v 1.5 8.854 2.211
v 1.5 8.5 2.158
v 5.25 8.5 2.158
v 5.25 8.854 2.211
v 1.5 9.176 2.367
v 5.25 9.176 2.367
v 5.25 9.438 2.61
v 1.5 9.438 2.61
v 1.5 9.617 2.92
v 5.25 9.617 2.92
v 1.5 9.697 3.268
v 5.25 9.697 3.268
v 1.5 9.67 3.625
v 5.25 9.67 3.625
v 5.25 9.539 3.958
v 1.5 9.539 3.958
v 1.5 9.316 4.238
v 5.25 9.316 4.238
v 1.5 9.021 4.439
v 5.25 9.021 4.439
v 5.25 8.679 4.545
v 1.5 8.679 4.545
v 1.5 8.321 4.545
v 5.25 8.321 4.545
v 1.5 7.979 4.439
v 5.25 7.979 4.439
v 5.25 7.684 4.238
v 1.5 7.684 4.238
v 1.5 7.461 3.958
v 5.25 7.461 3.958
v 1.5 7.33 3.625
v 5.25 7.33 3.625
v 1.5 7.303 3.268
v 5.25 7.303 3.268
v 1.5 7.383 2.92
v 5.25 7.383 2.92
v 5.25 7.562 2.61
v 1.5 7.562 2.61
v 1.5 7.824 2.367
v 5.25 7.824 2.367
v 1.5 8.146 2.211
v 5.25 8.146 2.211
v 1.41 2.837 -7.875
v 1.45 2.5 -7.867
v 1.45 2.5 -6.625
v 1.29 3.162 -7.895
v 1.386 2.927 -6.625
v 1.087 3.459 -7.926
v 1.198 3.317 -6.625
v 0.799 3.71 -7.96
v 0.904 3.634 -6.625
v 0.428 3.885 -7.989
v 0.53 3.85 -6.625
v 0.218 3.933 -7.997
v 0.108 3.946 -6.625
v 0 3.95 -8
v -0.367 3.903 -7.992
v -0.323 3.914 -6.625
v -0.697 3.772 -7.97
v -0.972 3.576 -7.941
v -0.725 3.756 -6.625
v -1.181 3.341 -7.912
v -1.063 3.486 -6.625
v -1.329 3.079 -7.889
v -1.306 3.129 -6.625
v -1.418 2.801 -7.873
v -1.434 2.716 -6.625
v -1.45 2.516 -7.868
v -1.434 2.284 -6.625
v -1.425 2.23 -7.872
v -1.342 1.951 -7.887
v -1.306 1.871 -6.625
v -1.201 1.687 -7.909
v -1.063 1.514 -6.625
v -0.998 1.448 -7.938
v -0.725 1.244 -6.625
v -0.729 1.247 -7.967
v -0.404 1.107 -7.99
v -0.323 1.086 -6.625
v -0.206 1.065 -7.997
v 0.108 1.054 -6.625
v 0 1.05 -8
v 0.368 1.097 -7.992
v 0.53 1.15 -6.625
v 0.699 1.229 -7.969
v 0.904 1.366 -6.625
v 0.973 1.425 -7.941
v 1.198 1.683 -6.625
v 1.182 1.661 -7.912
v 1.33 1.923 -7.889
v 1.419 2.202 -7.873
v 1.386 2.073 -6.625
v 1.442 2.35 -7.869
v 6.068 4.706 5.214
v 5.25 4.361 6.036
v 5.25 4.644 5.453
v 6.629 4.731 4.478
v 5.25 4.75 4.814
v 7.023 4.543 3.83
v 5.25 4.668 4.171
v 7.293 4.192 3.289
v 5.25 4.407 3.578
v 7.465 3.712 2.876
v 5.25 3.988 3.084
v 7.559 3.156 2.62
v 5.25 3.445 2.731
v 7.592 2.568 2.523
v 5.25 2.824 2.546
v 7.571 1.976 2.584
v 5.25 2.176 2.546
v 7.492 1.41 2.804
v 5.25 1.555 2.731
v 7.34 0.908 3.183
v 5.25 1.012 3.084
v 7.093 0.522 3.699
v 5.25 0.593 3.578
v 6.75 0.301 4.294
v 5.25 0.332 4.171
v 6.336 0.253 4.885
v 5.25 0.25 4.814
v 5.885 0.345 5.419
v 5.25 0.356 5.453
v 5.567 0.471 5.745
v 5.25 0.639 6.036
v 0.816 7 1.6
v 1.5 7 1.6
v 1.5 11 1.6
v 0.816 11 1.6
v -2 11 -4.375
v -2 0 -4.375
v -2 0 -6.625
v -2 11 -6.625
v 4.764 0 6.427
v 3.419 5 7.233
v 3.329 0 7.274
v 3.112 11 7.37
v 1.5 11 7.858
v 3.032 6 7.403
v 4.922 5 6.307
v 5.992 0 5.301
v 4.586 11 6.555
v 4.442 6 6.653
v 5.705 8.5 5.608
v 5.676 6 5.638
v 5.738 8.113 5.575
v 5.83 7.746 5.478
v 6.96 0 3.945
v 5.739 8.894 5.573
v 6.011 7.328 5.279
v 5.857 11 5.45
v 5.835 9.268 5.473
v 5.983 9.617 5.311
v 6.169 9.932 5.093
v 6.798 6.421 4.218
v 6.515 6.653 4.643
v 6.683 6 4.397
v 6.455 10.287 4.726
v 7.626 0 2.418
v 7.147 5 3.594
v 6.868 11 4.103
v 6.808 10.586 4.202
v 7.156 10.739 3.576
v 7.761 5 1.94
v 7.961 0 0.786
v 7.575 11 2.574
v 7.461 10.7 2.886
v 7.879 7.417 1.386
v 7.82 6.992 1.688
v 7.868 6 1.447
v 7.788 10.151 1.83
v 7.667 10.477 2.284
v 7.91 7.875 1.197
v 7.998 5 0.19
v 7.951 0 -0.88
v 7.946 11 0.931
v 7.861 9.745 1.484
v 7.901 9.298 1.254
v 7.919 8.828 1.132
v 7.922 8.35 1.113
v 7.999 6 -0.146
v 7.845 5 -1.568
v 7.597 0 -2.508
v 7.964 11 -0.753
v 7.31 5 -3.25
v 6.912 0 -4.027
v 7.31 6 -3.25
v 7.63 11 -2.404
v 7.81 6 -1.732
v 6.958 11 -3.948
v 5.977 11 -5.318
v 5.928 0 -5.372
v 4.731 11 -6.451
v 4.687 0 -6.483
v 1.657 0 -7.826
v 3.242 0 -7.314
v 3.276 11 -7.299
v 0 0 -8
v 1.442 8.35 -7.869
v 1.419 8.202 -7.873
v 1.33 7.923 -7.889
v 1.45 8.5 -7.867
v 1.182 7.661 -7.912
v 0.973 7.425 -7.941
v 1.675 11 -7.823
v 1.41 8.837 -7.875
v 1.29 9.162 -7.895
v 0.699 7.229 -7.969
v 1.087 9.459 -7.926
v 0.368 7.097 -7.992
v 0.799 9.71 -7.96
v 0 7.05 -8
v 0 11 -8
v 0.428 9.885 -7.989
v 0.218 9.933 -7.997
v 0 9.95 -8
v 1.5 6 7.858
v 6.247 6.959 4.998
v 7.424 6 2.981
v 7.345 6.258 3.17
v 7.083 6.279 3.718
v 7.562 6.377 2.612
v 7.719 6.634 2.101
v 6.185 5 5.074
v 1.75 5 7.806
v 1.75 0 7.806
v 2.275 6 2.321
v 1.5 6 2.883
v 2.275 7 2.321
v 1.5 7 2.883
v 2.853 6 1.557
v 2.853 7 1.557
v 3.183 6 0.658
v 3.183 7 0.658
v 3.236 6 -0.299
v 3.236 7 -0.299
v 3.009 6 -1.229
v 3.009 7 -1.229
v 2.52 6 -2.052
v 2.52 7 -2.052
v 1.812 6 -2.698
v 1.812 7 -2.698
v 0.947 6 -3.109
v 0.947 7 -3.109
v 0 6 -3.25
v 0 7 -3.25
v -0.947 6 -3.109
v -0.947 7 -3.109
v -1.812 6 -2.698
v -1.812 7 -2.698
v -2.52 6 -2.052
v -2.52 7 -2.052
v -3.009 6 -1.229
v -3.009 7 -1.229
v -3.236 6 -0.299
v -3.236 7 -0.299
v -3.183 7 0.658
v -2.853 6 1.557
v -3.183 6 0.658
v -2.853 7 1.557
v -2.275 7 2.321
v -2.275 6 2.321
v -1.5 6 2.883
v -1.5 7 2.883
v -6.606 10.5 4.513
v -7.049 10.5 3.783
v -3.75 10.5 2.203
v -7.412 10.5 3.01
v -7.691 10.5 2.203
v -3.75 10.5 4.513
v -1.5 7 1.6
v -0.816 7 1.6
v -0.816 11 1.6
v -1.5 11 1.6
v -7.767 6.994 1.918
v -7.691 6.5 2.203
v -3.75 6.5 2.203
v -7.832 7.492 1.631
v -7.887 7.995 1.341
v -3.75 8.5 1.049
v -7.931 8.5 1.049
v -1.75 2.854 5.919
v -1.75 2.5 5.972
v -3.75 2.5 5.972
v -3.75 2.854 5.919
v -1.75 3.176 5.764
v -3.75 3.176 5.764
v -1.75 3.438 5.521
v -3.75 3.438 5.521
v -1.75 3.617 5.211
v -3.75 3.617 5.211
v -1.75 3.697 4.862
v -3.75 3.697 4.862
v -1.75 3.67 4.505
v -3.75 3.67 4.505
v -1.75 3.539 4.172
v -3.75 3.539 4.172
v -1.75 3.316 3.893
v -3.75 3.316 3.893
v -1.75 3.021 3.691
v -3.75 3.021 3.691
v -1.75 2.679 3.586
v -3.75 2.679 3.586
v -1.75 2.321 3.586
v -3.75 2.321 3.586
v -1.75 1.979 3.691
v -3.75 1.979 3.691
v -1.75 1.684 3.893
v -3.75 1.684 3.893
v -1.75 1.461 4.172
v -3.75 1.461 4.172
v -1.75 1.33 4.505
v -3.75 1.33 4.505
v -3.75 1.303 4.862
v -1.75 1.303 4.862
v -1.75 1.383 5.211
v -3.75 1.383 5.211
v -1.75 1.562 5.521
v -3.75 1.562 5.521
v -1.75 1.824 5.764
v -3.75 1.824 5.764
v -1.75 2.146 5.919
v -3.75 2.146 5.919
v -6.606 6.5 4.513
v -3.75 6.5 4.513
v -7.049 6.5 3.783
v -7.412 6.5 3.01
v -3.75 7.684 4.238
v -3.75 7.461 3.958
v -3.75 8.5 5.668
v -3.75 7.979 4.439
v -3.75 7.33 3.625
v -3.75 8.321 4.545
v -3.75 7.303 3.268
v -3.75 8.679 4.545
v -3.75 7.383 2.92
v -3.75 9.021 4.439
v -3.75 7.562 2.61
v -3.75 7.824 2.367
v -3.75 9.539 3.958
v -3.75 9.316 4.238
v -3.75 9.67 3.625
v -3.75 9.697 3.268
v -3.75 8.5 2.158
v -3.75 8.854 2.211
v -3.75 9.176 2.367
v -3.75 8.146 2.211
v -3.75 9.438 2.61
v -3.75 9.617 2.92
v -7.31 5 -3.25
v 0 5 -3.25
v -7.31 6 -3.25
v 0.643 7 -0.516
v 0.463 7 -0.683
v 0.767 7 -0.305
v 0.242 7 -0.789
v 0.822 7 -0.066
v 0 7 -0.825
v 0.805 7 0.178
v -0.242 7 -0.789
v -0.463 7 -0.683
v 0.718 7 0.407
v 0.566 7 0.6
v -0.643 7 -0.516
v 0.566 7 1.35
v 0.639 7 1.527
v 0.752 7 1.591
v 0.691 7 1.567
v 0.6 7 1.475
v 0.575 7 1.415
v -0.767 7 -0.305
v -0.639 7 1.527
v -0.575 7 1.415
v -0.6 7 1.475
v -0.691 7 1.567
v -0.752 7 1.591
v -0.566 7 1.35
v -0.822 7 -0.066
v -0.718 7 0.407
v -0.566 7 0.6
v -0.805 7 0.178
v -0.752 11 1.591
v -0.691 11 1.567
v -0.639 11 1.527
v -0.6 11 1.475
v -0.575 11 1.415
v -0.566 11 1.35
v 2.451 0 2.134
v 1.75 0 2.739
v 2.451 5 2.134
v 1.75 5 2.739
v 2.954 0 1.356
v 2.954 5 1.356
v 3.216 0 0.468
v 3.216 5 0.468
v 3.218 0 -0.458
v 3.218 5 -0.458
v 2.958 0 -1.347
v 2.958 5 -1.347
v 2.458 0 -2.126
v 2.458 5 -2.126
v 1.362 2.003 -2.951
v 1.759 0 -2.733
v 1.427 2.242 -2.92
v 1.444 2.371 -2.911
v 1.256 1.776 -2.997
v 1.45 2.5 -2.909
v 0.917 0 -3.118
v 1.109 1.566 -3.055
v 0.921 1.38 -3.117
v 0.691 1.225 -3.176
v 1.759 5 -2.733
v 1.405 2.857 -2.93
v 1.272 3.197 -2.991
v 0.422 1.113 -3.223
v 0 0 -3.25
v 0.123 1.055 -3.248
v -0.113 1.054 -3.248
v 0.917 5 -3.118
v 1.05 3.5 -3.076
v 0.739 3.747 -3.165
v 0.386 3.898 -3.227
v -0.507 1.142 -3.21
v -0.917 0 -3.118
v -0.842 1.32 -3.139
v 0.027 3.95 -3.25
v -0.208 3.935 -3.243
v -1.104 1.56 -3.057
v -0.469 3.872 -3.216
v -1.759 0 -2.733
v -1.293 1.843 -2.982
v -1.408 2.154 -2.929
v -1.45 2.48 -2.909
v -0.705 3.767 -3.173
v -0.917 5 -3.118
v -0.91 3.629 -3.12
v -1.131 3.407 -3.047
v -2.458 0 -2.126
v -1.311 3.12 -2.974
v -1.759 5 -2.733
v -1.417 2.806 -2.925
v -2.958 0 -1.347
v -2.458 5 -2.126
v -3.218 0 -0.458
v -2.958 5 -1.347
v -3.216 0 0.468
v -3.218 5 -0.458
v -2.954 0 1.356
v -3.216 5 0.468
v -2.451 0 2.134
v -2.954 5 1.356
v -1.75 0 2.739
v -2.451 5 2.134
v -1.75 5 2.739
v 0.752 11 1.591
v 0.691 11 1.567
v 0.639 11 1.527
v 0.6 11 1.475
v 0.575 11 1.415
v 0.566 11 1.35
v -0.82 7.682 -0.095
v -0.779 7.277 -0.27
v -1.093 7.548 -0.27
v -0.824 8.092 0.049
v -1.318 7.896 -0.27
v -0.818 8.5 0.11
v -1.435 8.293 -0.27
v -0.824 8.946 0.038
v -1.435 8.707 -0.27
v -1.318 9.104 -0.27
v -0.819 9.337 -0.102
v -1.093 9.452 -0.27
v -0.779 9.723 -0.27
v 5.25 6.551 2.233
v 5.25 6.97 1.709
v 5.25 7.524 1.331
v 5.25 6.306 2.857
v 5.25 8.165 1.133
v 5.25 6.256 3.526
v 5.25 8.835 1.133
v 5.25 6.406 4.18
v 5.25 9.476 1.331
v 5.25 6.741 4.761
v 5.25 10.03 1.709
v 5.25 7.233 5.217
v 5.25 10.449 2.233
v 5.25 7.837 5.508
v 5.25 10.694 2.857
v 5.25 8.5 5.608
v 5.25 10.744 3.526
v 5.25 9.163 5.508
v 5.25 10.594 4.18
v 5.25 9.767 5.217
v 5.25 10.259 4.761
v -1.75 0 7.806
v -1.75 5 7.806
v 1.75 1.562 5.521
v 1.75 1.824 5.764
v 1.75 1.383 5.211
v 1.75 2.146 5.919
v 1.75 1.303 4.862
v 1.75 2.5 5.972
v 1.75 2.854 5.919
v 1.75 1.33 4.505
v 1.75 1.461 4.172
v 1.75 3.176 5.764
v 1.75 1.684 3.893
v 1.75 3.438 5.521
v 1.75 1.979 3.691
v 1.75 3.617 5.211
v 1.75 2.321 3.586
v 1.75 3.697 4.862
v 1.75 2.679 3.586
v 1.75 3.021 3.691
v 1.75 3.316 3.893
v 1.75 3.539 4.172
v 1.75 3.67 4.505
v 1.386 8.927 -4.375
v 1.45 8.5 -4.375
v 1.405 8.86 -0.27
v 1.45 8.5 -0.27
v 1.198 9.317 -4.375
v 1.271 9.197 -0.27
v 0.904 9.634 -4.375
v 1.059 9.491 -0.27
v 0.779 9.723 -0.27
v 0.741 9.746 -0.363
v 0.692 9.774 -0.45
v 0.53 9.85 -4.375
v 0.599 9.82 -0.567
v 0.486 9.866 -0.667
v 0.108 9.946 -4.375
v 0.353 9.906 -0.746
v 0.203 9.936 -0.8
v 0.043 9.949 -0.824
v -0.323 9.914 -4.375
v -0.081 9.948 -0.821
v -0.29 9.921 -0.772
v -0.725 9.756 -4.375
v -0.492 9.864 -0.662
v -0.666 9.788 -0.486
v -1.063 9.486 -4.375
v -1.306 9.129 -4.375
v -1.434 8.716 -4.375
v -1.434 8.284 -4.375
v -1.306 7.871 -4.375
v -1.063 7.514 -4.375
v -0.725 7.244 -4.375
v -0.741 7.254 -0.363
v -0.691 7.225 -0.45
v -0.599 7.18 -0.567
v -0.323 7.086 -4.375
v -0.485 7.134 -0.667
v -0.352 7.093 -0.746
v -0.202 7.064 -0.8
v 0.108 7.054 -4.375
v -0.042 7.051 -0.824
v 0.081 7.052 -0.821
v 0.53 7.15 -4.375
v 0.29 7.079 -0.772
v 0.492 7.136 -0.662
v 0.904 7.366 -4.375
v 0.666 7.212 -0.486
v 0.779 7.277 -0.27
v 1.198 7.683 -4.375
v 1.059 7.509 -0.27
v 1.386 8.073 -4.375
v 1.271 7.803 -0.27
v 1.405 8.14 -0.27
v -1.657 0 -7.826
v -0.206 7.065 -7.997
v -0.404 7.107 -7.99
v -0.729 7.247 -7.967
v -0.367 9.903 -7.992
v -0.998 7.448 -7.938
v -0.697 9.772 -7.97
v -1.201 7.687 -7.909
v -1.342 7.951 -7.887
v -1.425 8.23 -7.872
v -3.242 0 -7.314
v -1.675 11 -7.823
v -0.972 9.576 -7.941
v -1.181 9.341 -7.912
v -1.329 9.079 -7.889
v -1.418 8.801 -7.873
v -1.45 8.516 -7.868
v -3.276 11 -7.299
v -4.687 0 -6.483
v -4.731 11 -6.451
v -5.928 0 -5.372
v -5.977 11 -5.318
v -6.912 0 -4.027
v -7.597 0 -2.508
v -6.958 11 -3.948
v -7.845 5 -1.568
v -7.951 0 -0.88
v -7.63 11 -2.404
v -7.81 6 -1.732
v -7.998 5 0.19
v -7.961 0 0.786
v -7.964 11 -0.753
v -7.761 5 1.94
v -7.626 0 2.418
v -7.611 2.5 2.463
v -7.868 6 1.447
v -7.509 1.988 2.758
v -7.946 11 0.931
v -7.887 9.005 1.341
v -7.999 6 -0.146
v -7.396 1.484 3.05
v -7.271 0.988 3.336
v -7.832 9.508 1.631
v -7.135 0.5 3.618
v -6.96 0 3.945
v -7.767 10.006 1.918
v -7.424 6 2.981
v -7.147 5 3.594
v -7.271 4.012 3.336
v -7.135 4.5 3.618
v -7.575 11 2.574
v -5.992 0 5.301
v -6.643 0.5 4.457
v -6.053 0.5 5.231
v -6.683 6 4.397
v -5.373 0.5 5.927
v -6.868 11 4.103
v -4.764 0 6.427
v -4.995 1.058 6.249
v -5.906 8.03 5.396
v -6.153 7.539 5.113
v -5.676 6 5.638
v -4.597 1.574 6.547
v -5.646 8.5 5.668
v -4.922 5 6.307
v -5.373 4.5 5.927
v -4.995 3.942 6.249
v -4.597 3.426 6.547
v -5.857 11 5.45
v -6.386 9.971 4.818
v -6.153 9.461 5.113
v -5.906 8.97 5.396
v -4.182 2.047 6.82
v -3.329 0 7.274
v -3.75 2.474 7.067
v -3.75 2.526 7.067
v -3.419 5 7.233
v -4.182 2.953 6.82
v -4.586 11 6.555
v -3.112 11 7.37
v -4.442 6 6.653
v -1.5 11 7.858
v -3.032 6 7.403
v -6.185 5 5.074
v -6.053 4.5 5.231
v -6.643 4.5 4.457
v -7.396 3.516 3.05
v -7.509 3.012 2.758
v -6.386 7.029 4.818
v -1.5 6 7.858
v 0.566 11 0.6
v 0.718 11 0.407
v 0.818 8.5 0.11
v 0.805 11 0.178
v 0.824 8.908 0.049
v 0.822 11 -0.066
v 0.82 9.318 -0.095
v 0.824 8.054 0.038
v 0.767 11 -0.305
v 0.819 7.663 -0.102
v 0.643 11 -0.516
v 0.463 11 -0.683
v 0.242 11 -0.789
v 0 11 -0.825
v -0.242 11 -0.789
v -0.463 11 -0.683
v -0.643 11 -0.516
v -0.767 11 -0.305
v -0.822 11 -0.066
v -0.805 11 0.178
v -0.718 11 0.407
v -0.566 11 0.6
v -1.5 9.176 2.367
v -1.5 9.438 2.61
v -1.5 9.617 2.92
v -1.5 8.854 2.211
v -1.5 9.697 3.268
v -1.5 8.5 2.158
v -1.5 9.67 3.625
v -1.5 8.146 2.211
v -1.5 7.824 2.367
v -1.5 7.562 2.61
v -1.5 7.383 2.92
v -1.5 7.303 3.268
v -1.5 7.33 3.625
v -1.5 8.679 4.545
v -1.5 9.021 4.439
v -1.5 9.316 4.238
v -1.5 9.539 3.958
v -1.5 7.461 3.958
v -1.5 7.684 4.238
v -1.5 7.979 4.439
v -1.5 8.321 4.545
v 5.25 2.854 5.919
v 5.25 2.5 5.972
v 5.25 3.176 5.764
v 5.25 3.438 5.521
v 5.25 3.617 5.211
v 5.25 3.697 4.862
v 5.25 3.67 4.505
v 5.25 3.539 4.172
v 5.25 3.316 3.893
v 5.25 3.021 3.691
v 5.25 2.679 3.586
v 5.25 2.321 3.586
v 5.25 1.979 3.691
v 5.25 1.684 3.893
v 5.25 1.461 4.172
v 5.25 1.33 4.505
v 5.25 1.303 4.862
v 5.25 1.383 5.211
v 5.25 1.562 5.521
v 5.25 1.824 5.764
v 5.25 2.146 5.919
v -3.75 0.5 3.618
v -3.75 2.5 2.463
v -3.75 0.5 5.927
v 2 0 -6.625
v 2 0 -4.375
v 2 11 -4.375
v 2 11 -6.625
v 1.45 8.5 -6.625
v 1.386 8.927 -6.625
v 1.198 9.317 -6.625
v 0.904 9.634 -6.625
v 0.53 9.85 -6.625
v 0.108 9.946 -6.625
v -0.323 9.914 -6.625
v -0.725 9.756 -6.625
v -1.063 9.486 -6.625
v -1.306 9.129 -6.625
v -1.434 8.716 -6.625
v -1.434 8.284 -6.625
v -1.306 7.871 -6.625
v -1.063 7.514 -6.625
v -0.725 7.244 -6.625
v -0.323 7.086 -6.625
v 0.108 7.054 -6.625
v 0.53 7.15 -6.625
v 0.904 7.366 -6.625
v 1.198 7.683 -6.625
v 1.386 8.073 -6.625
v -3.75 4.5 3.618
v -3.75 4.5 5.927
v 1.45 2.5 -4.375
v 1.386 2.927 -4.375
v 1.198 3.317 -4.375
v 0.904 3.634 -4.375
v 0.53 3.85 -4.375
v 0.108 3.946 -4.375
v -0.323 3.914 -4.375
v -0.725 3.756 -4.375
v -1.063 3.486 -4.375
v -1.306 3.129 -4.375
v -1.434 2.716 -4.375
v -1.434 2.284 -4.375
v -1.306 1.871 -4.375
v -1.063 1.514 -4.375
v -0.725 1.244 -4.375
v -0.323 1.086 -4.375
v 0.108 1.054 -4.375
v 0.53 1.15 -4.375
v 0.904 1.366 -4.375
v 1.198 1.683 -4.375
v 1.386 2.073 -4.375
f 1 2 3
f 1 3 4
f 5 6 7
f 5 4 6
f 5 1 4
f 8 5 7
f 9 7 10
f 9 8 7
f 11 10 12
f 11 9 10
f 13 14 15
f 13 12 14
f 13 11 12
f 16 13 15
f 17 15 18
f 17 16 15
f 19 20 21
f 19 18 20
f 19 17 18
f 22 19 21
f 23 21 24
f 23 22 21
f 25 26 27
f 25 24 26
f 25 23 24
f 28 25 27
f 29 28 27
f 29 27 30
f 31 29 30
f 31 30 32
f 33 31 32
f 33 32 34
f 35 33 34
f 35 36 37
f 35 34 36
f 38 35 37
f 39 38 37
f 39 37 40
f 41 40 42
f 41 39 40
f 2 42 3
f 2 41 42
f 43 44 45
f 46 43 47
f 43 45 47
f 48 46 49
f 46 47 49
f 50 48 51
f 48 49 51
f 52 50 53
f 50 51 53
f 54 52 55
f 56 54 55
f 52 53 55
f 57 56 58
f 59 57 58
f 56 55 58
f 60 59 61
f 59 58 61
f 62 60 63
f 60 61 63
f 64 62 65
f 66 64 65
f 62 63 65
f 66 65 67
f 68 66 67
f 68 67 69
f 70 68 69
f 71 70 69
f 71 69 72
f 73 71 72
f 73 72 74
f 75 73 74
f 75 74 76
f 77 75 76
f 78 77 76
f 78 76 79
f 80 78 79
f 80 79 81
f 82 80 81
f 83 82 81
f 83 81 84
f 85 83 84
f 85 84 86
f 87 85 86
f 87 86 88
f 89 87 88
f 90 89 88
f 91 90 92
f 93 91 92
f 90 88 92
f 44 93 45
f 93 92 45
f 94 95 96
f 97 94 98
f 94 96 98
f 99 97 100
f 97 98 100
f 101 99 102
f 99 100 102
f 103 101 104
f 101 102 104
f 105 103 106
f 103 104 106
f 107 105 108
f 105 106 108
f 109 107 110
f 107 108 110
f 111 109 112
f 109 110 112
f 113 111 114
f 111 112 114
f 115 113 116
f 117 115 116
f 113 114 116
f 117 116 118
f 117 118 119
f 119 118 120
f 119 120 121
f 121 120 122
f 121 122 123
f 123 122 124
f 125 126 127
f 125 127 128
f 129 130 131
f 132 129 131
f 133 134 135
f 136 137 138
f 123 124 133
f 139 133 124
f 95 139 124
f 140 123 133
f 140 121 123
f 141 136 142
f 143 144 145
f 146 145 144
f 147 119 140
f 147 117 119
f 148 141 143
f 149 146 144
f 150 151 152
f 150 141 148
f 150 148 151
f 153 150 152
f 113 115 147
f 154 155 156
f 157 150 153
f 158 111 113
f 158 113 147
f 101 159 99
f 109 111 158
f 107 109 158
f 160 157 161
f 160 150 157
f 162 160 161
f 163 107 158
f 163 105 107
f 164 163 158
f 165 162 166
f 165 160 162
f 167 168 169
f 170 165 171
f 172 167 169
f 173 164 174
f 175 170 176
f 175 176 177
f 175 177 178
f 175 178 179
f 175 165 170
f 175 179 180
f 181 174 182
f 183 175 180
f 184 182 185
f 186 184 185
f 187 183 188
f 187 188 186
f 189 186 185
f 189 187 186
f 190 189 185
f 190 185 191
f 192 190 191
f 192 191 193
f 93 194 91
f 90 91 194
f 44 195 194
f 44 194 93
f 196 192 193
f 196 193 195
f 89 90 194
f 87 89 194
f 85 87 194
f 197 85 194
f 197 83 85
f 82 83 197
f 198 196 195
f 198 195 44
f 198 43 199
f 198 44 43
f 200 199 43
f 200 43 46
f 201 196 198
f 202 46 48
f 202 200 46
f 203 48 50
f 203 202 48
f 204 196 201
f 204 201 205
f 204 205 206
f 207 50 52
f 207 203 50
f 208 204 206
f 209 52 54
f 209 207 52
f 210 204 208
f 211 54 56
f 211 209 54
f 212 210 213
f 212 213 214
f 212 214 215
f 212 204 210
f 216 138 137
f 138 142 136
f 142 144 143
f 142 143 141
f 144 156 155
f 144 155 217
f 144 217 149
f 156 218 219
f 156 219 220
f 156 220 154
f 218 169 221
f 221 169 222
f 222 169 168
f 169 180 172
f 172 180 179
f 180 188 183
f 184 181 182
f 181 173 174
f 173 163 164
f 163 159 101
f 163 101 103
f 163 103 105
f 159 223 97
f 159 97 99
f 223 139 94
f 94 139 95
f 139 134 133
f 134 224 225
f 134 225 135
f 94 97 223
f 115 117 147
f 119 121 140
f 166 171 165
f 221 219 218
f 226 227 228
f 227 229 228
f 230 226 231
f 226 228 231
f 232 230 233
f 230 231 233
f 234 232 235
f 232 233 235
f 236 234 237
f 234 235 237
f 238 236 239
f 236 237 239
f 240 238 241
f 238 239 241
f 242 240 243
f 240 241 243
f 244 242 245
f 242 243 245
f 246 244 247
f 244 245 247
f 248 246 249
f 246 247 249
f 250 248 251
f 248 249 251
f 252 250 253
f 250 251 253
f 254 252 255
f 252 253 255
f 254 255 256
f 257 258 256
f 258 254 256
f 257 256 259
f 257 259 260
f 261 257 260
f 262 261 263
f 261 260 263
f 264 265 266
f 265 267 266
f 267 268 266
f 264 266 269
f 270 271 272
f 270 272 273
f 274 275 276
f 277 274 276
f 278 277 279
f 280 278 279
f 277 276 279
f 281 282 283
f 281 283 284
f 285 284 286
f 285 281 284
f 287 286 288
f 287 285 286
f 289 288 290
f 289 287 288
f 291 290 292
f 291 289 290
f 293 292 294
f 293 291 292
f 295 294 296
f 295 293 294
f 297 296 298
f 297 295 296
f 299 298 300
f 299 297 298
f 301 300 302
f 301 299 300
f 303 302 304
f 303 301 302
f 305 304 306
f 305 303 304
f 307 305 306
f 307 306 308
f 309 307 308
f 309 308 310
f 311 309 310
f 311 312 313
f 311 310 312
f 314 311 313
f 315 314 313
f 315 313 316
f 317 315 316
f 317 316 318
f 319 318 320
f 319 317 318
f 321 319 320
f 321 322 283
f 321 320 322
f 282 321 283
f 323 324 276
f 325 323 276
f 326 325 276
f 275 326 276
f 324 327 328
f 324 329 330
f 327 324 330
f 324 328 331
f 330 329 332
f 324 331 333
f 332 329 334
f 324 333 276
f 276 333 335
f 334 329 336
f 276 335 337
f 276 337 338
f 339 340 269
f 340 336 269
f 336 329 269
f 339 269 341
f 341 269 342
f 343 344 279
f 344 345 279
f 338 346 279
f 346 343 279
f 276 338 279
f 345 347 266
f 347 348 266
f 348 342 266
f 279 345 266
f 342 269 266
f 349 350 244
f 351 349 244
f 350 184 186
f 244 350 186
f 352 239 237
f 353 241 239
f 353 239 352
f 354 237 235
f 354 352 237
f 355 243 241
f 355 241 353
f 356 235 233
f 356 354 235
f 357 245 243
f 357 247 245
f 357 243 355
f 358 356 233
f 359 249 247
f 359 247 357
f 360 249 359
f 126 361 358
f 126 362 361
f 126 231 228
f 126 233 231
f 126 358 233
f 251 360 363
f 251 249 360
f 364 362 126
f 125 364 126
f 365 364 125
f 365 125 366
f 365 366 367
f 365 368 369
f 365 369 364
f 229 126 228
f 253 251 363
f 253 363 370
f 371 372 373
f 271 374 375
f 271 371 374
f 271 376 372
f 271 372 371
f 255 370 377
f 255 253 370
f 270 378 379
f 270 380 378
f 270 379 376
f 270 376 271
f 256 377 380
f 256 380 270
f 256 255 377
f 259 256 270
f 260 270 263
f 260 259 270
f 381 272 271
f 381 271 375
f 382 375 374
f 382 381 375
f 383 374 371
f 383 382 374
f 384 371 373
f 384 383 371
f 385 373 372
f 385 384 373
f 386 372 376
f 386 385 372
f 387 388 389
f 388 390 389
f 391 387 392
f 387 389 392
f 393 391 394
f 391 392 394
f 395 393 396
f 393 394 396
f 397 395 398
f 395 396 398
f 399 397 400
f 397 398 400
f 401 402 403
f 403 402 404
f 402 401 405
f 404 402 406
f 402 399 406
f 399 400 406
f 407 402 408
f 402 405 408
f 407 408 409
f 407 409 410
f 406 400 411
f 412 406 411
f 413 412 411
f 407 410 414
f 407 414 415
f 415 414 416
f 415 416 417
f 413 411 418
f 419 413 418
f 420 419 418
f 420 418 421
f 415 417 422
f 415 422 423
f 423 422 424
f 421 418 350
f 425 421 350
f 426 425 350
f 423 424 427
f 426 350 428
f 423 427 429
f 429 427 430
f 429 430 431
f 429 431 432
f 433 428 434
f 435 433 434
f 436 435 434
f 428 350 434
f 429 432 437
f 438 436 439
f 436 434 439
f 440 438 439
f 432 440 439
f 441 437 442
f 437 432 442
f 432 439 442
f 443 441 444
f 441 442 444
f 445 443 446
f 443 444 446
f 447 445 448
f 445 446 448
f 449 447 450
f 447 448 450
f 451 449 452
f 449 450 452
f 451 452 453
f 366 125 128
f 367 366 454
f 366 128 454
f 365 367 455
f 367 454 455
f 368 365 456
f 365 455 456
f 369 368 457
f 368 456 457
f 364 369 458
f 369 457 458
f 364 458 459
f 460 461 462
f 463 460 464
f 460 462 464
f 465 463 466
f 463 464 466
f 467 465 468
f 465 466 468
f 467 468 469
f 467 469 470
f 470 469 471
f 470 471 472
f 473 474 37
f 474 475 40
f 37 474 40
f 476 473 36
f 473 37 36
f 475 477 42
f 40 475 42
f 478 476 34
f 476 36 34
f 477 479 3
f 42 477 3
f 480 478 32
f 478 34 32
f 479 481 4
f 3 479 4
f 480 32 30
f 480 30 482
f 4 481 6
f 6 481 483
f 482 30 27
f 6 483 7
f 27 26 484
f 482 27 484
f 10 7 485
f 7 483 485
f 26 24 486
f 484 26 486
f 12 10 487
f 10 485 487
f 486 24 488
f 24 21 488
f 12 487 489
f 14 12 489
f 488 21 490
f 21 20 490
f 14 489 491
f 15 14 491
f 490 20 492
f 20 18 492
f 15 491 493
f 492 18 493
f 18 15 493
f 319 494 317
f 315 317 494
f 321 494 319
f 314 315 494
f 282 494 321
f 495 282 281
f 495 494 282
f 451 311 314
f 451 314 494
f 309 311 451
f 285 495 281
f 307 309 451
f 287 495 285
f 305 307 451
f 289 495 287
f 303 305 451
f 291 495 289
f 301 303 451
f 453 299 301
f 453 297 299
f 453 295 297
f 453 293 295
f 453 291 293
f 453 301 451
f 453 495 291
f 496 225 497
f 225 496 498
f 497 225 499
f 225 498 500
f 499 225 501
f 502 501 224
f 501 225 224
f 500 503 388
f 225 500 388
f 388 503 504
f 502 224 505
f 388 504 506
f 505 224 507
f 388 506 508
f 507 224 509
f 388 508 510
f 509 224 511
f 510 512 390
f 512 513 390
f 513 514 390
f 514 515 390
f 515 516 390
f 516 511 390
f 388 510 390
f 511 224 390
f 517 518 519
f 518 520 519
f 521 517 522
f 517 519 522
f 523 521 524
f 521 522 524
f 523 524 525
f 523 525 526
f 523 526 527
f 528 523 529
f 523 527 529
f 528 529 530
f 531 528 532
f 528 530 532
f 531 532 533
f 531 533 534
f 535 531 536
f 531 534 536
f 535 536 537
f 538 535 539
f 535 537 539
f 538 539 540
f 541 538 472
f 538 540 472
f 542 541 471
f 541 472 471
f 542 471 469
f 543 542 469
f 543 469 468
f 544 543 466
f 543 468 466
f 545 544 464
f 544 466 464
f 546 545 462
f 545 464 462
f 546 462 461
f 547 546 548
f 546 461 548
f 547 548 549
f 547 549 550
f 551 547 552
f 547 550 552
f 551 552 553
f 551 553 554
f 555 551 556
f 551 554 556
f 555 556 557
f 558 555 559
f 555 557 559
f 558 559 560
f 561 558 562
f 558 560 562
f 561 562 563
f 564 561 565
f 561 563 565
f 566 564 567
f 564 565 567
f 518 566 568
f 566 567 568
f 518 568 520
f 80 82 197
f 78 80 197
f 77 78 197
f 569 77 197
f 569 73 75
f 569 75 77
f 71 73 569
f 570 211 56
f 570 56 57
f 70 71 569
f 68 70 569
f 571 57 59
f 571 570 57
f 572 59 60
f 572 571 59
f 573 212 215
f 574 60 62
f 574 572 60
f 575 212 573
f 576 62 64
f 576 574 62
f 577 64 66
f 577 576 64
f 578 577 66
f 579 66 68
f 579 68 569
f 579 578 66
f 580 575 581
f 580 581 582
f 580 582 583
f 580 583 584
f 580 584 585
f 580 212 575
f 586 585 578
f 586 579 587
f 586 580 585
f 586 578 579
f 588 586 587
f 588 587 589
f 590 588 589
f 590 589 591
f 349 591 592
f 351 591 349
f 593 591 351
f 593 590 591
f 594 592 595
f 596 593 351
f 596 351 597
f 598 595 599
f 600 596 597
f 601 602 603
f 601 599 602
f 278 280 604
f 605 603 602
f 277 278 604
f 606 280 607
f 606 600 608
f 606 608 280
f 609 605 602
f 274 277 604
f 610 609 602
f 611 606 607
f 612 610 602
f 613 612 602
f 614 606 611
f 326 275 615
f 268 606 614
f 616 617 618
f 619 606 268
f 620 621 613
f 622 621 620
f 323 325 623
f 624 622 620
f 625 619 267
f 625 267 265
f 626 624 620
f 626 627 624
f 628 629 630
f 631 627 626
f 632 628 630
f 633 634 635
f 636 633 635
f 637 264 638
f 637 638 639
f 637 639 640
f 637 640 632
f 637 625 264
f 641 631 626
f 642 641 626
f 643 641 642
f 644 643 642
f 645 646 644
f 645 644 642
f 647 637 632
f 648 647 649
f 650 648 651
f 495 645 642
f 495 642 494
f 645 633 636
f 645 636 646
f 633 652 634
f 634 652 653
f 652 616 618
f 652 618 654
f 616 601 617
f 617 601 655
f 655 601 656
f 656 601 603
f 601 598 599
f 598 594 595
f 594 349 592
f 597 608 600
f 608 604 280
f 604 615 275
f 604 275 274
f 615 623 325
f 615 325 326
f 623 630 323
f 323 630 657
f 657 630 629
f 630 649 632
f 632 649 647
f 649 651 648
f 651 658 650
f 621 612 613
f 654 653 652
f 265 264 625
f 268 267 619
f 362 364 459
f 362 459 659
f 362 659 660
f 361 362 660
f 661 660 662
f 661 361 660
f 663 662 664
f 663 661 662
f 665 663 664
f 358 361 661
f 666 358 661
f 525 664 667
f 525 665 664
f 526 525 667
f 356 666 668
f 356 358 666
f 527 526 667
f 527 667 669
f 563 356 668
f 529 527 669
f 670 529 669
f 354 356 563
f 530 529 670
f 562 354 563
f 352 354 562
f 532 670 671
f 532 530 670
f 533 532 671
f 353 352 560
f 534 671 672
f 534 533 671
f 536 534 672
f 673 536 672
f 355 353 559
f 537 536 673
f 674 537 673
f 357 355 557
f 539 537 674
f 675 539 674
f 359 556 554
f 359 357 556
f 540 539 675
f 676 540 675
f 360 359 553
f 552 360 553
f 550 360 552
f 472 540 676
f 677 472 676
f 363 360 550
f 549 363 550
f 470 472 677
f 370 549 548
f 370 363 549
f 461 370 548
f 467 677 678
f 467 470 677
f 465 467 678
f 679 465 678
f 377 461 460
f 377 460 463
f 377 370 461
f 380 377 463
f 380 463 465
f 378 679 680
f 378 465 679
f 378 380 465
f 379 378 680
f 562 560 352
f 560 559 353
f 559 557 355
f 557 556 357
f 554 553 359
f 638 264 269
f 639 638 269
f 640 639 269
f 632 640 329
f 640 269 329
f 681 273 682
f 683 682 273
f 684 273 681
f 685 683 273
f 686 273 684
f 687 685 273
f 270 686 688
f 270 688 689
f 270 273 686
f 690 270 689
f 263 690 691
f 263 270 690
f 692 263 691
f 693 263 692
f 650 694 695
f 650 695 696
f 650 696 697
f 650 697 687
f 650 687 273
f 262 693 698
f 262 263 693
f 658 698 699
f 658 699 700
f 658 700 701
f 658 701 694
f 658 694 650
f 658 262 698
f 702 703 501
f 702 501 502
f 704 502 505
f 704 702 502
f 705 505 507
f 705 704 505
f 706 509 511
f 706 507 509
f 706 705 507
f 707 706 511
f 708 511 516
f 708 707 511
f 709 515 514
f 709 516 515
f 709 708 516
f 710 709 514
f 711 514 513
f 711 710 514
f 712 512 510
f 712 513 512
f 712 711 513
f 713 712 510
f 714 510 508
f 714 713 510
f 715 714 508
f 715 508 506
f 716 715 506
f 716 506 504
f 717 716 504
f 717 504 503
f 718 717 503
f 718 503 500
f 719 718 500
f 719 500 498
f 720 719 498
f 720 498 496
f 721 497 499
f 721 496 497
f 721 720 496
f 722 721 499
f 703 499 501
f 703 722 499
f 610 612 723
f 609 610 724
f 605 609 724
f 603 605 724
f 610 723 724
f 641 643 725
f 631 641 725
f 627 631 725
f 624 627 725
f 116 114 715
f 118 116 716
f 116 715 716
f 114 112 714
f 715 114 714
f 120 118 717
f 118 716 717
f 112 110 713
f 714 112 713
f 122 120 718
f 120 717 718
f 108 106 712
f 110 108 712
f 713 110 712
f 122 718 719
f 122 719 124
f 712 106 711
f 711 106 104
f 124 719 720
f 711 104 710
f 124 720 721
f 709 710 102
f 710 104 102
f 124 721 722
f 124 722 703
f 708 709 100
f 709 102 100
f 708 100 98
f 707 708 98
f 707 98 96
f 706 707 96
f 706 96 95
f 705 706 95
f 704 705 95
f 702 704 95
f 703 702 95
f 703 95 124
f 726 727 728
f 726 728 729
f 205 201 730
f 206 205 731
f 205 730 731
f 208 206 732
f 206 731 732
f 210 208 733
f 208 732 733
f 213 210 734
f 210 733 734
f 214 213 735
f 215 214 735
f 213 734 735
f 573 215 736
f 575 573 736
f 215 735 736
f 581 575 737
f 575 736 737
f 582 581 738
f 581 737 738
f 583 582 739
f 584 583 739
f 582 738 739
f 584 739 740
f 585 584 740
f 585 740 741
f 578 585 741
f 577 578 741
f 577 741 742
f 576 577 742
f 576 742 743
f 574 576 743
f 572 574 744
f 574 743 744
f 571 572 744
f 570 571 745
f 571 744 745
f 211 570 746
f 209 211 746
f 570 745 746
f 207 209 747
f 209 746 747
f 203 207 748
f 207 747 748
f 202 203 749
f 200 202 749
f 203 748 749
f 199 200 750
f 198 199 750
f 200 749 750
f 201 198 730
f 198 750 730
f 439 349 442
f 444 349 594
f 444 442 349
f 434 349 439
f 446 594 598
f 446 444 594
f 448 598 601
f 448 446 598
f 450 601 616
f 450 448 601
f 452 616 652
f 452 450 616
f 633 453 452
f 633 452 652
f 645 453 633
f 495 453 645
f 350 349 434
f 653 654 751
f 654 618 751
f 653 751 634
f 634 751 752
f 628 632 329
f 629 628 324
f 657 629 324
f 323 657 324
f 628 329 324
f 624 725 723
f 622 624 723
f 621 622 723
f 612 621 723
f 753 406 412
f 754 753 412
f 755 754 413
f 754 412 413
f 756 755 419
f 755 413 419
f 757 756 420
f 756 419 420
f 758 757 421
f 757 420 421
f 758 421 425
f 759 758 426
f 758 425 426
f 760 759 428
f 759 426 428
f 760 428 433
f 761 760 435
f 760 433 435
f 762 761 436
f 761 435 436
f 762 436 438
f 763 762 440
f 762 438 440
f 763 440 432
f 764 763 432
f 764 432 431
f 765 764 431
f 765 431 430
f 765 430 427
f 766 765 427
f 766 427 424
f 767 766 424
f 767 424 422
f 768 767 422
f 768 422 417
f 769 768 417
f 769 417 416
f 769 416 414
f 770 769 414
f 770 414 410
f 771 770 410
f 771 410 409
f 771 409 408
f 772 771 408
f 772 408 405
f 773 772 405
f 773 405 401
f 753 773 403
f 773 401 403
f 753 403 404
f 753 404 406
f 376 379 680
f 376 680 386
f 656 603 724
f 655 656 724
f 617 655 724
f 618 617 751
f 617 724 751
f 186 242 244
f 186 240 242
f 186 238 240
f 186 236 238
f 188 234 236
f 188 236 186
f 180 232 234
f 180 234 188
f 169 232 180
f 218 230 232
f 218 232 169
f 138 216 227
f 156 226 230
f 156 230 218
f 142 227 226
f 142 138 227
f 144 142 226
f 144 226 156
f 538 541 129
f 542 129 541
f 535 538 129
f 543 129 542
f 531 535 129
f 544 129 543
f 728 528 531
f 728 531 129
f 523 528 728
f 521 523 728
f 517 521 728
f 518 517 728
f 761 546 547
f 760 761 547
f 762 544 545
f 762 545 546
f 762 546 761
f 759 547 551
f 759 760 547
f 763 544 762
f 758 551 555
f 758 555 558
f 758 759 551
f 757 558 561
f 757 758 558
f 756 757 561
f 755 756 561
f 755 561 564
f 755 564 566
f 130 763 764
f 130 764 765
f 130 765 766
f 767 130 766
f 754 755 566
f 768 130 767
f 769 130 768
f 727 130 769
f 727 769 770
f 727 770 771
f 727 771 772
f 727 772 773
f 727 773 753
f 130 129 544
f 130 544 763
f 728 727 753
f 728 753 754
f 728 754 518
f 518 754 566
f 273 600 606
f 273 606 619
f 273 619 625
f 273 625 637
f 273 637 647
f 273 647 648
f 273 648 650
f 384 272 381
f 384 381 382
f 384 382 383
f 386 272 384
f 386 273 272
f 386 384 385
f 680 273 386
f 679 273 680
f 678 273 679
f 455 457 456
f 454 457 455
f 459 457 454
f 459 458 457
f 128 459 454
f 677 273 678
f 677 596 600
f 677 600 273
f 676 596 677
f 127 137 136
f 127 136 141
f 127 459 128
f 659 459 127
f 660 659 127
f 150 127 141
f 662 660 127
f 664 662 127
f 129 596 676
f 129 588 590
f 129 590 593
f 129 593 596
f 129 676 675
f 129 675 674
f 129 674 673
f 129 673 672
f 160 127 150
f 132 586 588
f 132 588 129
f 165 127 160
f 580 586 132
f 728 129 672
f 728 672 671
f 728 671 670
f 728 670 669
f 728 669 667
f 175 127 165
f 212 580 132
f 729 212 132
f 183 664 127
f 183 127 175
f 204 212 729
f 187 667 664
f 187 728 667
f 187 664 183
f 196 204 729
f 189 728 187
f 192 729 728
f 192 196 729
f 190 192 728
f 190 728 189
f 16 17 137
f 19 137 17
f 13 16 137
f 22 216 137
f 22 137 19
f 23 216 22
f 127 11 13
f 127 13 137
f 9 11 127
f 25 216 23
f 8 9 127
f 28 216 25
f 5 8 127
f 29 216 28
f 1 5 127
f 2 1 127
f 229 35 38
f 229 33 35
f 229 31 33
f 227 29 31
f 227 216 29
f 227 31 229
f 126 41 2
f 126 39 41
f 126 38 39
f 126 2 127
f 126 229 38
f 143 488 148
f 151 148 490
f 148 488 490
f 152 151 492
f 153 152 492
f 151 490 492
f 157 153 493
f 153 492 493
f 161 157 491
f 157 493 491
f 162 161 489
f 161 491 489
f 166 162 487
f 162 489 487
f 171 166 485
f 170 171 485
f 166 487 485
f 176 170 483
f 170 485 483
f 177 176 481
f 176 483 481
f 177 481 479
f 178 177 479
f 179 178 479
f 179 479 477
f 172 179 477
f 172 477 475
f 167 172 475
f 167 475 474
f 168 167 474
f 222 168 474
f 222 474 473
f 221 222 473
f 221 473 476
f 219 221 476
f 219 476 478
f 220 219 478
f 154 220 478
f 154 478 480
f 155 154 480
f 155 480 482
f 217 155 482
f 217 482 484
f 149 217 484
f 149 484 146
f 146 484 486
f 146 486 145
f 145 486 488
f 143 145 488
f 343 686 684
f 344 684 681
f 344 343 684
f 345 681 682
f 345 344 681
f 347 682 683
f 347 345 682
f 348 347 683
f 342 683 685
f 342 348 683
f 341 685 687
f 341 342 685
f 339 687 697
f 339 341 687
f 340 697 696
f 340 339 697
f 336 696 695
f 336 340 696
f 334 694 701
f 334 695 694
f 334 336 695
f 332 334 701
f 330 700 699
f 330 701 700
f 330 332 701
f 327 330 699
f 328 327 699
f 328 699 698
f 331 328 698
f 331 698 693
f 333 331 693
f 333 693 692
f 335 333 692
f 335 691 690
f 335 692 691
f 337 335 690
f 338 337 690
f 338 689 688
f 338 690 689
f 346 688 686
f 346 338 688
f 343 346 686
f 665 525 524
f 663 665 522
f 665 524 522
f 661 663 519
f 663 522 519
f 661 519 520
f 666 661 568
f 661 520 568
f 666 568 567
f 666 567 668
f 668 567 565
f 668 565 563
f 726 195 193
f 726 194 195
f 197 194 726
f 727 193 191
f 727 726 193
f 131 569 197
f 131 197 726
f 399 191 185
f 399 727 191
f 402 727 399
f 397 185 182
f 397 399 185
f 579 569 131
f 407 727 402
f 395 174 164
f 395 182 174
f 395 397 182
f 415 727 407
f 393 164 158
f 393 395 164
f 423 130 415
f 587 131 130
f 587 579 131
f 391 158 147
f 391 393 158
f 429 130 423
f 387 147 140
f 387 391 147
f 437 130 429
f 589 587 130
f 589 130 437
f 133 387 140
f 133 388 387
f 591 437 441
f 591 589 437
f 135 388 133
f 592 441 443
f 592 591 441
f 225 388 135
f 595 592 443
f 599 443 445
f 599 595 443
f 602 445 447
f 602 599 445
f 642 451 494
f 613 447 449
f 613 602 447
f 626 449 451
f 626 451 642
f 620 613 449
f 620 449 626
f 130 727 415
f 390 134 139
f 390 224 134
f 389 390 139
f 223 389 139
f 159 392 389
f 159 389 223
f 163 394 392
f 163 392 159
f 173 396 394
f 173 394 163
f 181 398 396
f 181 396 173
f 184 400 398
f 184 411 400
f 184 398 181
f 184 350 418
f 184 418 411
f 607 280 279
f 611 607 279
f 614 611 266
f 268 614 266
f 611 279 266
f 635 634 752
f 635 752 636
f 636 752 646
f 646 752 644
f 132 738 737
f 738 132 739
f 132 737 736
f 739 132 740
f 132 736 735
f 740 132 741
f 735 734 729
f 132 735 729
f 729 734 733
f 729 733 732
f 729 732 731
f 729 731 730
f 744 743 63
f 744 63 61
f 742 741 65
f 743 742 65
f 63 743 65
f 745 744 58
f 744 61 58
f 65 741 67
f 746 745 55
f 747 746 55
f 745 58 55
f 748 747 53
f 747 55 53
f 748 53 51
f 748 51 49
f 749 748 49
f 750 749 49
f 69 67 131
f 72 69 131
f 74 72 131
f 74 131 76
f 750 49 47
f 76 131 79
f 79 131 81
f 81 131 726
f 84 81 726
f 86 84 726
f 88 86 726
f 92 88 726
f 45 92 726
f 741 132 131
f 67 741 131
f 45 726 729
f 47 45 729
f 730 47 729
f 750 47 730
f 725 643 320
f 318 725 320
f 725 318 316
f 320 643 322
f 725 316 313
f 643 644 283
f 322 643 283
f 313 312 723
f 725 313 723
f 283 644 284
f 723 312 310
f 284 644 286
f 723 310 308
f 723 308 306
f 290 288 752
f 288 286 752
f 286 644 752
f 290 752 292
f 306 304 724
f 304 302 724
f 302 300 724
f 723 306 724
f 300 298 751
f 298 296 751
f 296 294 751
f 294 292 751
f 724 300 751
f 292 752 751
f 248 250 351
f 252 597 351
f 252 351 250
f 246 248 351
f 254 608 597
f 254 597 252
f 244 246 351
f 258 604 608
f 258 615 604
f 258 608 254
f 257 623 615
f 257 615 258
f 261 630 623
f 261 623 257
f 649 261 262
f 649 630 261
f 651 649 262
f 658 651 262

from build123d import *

# Parameters (mm, degrees)
SKETCH1_W                            = 4.75
SKETCH1_H                            = 7
FILLET1_R                            = 1
SKETCH16_W                           = 16
SKETCH16_H                           = 1
CUT_EXTRUDE5_DEPTH                   = 1
CUT_EXTRUDE5_DIRECTION_2_REACH       = 18.492
CUT_EXTRUDE6_REACH                   = 15.304
SKETCH17_W                           = 3.5
SKETCH17_H                           = 5.261387212
CUT_EXTRUDE7_DEPTH                   = 18.408690359
CUT_EXTRUDE7_DEPTH_BACK              = 18.408690359
SKETCH18_R                           = 1.2
CUT_EXTRUDE10_START                  = -6
SKETCH21_R                           = 0.825
CUT_EXTRUDE10_DEPTH                  = 6
CUT_EXTRUDE11_DEPTH                  = 18.26991621
CUT_EXTRUDE11_DEPTH_BACK             = 18.26991621
SKETCH22_R                           = 1.2
CUT_EXTRUDE9_REACH                   = 20.603
CUT_EXTRUDE9_END_RADIUS              = 8
SKETCH20_R                           = 1.2
CUT_EXTRUDE12_REACH                  = 21.585
SKETCH19_R                           = 2.25
CUT_EXTRUDE13_REACH                  = 21.585
CUT_EXTRUDE13_END_RADIUS             = 8
SKETCH24_R                           = 2.25
CUT_EXTRUDE14_REACH                  = 18.492
CUT_EXTRUDE14_END_RADIUS             = 8
SKETCH25_W                           = 2.25
SKETCH25_H                           = 1
CUT_EXTRUDE14_DIRECTION_2_REACH      = 18.492
CUT_EXTRUDE14_DIRECTION_2_END_RADIUS = 8
M2_5_CLEARANCE_HOLE1_D               = 2.9
M2_5_CLEARANCE_HOLE1_DEPTH           = 7.729752102
M2_5_CLEARANCE_HOLE1_TIP             = 0.871247898
CUT_EXTRUDE15_START                  = -12
SKETCH29_W                           = 4
SKETCH29_H                           = 2.25
CUT_EXTRUDE15_DEPTH                  = 12
FILLET3_R                            = 0.25
SKETCH30_R                           = 8
CUT_EXTRUDE19_DEPTH                  = 1


with BuildPart() as part:
    # Sketch1 → Revolve1 (revolve)
    with BuildSketch(Plane.XY, mode=Mode.PRIVATE) as revolve1_sk:
        with Locations((5.625, 3.5)):
            Rectangle(SKETCH1_W, SKETCH1_H)
    revolve(revolve1_sk.sketch.rotate(Axis((0, 0, 0), (0, 1, 0)), 90), axis=Axis((0, 0, 0), (0, 1, 0)))

    # Sketch1<3> → Revolve2 (revolve)
    with BuildSketch(Plane.XY, mode=Mode.PRIVATE) as revolve2_sk:
        Polygon((0.825, 7), (3.25, 7), (8, 7), (8, 12), (0.825, 12), align=None)
    revolve(revolve2_sk.sketch.rotate(Axis((0, 0, 0), (0, 1, 0)), 90), axis=Axis((0, 0, 0), (0, 1, 0)))

    # Fillet1
    fillet1_edges = [part.edges().sort_by_distance(p)[0] for p in [
        (0, 12, 8),
    ]]
    fillet(fillet1_edges, radius=FILLET1_R)

    # Sketch16 → Cut-Extrude5 (cut)
    with BuildSketch(Plane.XY):
        with Locations((0, 5.5)):
            Rectangle(SKETCH16_W, SKETCH16_H)
    extrude(amount=-CUT_EXTRUDE5_DEPTH, mode=Mode.SUBTRACT)

    # Sketch16 → Cut-Extrude5 direction 2 (cut, up to next)
    with BuildSketch(Plane.XY, mode=Mode.PRIVATE) as cut_extrude5_direction_2_sk1:
        with Locations((0, 5.5)):
            Rectangle(SKETCH16_W, SKETCH16_H)
    cut_extrude5_direction_2_tool1 = extrude(cut_extrude5_direction_2_sk1.sketch, amount=CUT_EXTRUDE5_DIRECTION_2_REACH, mode=Mode.PRIVATE) & part.part
    add(cut_extrude5_direction_2_tool1.solids().sort_by_distance((0, 5.5, 0))[0], mode=Mode.SUBTRACT)

    # Sketch17 → Cut-Extrude6 (cut, up to next)
    with BuildSketch(Plane(origin=(0, 5, 0), x_dir=(1, 0, 0), z_dir=(0, 1, 0)), mode=Mode.PRIVATE) as cut_extrude6_sk1:
        with Locations((0, -5.369306394)):
            Rectangle(SKETCH17_W, SKETCH17_H)
    cut_extrude6_tool1 = extrude(cut_extrude6_sk1.sketch, amount=-CUT_EXTRUDE6_REACH, mode=Mode.PRIVATE) & part.part
    add(cut_extrude6_tool1.solids().sort_by_distance((0, 5, 5.369306))[0], mode=Mode.SUBTRACT)

    # Sketch18 → Cut-Extrude7 (cut, two sides: drawn at the far end of the back side and taken through both)
    with BuildSketch(Plane.ZY.offset(-1.75).offset(-CUT_EXTRUDE7_DEPTH_BACK)):
        with Locations((4.772430143, 2.5)):
            Circle(SKETCH18_R)
    extrude(amount=CUT_EXTRUDE7_DEPTH + CUT_EXTRUDE7_DEPTH_BACK, mode=Mode.SUBTRACT)

    # Sketch21 → Cut-Extrude10 (cut)
    with BuildSketch(Plane(origin=(0, 12, 0), x_dir=(1, 0, 0), z_dir=(0, 1, 0)).offset(CUT_EXTRUDE10_START)):
        Circle(SKETCH21_R)
        Polygon((-1.5, -1.6), (-1.5, -11.891029443), (1.5, -11.891029443), (1.5, -1.6), (0.566237583, -1.6), (0.566237583, -0.6), (-0.566237583, -0.6), (-0.566237583, -1.6), align=None)
    extrude(amount=CUT_EXTRUDE10_DEPTH, mode=Mode.SUBTRACT)

    # Sketch22 → Cut-Extrude11 (cut, two sides: drawn at the far end of the back side and taken through both)
    with BuildSketch(Plane(origin=(-1.5, 0, 0), x_dir=(0, 0, -1), z_dir=(1, 0, 0)).offset(-CUT_EXTRUDE11_DEPTH_BACK)):
        with Locations((-3.358116823, 8.5)):
            Circle(SKETCH22_R)
    extrude(amount=CUT_EXTRUDE11_DEPTH + CUT_EXTRUDE11_DEPTH_BACK, mode=Mode.SUBTRACT)

    # Cut-Extrude9: up to this cylinder (the profile starts inside it)
    cut_extrude9_end = Plane(origin=(0, 5.9847245, 0), z_dir=(0, -1, 0)) * Cylinder(CUT_EXTRUDE9_END_RADIUS, 65.175449, mode=Mode.PRIVATE)
    # Sketch20 → Cut-Extrude9 (cut, up to the surface)
    with BuildSketch(Plane(origin=(-3.75, 0, 0), x_dir=(0, 0, -1), z_dir=(1, 0, 0)), mode=Mode.PRIVATE) as cut_extrude9_sk1:
        Polygon((-2.463029066, 2.5), (-3.617729604, 4.5), (-5.927130681, 4.5), (-7.08183122, 2.5), (-5.927130681, 0.5), (-3.617729604, 0.5), align=None)
    cut_extrude9_tool1 = extrude(cut_extrude9_sk1.sketch, amount=-CUT_EXTRUDE9_REACH, mode=Mode.PRIVATE) & cut_extrude9_end
    add(cut_extrude9_tool1.solids().sort_by_distance((-3.75, 2.5, 4.77243))[0], mode=Mode.SUBTRACT)
    # Sketch20 → Cut-Extrude9 (cut, up to the surface)
    with BuildSketch(Plane(origin=(-3.75, 0, 0), x_dir=(0, 0, -1), z_dir=(1, 0, 0)), mode=Mode.PRIVATE) as cut_extrude9_sk2:
        Polygon((-1.048715746, 8.5), (-2.203416284, 10.5), (-4.512817361, 10.5), (-5.6675179, 8.5), (-4.512817361, 6.5), (-2.203416284, 6.5), align=None)
        with Locations((-3.358116823, 8.5)):
            Circle(SKETCH20_R, mode=Mode.SUBTRACT)
    cut_extrude9_tool2 = extrude(cut_extrude9_sk2.sketch, amount=-CUT_EXTRUDE9_REACH, mode=Mode.PRIVATE) & cut_extrude9_end
    add(cut_extrude9_tool2.solids().sort_by_distance((-3.75, 9.469449, 1.678981))[0], mode=Mode.SUBTRACT)

    # Sketch19 → Cut-Extrude12 (cut, up to next)
    with BuildSketch(Plane.ZY.offset(-5.25), mode=Mode.PRIVATE) as cut_extrude12_sk1:
        with Locations((4.772430143, 2.5)):
            Circle(SKETCH19_R)
    cut_extrude12_tool1 = extrude(cut_extrude12_sk1.sketch, amount=-CUT_EXTRUDE12_REACH, mode=Mode.PRIVATE) & part.part
    add(cut_extrude12_tool1.solids().sort_by_distance((5.25, 2.5, 4.77243))[0], mode=Mode.SUBTRACT)

    # Cut-Extrude13: up to this cylinder (the profile starts inside it)
    cut_extrude13_end = Plane(origin=(0, 8.5, 0), z_dir=(0, -1, 0)) * Cylinder(CUT_EXTRUDE13_END_RADIUS, 60.17, mode=Mode.PRIVATE)
    # Sketch24 → Cut-Extrude13 (cut, up to the surface)
    with BuildSketch(Plane.ZY.offset(-5.25), mode=Mode.PRIVATE) as cut_extrude13_sk1:
        with Locations((3.358116823, 8.5)):
            Circle(SKETCH24_R)
    cut_extrude13_tool1 = extrude(cut_extrude13_sk1.sketch, amount=-CUT_EXTRUDE13_REACH, mode=Mode.PRIVATE) & cut_extrude13_end
    add(cut_extrude13_tool1.solids().sort_by_distance((5.25, 8.5, 3.358117))[0], mode=Mode.SUBTRACT)

    # Cut-Extrude14: up to this cylinder (the profile starts inside it)
    cut_extrude14_end = Plane(origin=(0, 5.5, 0), z_dir=(0, -1, 0)) * Cylinder(CUT_EXTRUDE14_END_RADIUS, 53.984, mode=Mode.PRIVATE)
    # Sketch25 → Cut-Extrude14 (cut, up to the surface)
    with BuildSketch(Plane.ZY, mode=Mode.PRIVATE) as cut_extrude14_sk1:
        with Locations((-2.125, 5.5)):
            Rectangle(SKETCH25_W, SKETCH25_H)
    cut_extrude14_tool1 = extrude(cut_extrude14_sk1.sketch, amount=-CUT_EXTRUDE14_REACH, mode=Mode.PRIVATE) & cut_extrude14_end
    add(cut_extrude14_tool1.solids().sort_by_distance((0, 5.5, -2.125))[0], mode=Mode.SUBTRACT)

    # Cut-Extrude14 direction 2: up to this cylinder (the profile starts inside it)
    cut_extrude14_direction_2_end = Plane(origin=(0, 5.5, 0), z_dir=(0, -1, 0)) * Cylinder(CUT_EXTRUDE14_DIRECTION_2_END_RADIUS, 53.984, mode=Mode.PRIVATE)
    # Sketch25 → Cut-Extrude14 direction 2 (cut, up to the surface)
    with BuildSketch(Plane.ZY, mode=Mode.PRIVATE) as cut_extrude14_direction_2_sk1:
        with Locations((-2.125, 5.5)):
            Rectangle(SKETCH25_W, SKETCH25_H)
    cut_extrude14_direction_2_tool1 = extrude(cut_extrude14_direction_2_sk1.sketch, amount=CUT_EXTRUDE14_DIRECTION_2_REACH, mode=Mode.PRIVATE) & cut_extrude14_direction_2_end
    add(cut_extrude14_direction_2_tool1.solids().sort_by_distance((0, 5.5, -2.125))[0], mode=Mode.SUBTRACT)

    # M2.5 Clearance Hole1
    with Locations(Plane(origin=(0, 0, -8), x_dir=(-1, 0, 0), z_dir=(0, 0, -1))):
        with Locations((0, 8.5), (0, 2.5)):
            Hole(M2_5_CLEARANCE_HOLE1_D / 2, depth=M2_5_CLEARANCE_HOLE1_DEPTH)
            with Locations((0, 0, -(M2_5_CLEARANCE_HOLE1_DEPTH + M2_5_CLEARANCE_HOLE1_TIP / 2))):  # 118° drill point
                Cone(0, M2_5_CLEARANCE_HOLE1_D / 2, M2_5_CLEARANCE_HOLE1_TIP, mode=Mode.SUBTRACT)

    # Sketch29 → Cut-Extrude15 (cut)
    with BuildSketch(Plane(origin=(0, 12, 0), x_dir=(1, 0, 0), z_dir=(0, 1, 0)).offset(CUT_EXTRUDE15_START)):
        with Locations((0, 5.5)):
            Rectangle(SKETCH29_W, SKETCH29_H)
    extrude(amount=CUT_EXTRUDE15_DEPTH, mode=Mode.SUBTRACT)

    # Fillet3
    fillet3_edges = [part.edges().sort_by_distance(p)[0] for p in [
        (0.566237583, 9.5, 1.6),
        (-0.566237583, 9.5, 1.6),
    ]]
    fillet(fillet3_edges, radius=FILLET3_R)

    # Sketch30 → Cut-Extrude19 (cut)
    with BuildSketch(Plane(origin=(0, 12, 0), x_dir=(1, 0, 0), z_dir=(0, 1, 0))):
        Circle(SKETCH30_R)
    extrude(amount=-CUT_EXTRUDE19_DEPTH, mode=Mode.SUBTRACT)


solid = part.part
